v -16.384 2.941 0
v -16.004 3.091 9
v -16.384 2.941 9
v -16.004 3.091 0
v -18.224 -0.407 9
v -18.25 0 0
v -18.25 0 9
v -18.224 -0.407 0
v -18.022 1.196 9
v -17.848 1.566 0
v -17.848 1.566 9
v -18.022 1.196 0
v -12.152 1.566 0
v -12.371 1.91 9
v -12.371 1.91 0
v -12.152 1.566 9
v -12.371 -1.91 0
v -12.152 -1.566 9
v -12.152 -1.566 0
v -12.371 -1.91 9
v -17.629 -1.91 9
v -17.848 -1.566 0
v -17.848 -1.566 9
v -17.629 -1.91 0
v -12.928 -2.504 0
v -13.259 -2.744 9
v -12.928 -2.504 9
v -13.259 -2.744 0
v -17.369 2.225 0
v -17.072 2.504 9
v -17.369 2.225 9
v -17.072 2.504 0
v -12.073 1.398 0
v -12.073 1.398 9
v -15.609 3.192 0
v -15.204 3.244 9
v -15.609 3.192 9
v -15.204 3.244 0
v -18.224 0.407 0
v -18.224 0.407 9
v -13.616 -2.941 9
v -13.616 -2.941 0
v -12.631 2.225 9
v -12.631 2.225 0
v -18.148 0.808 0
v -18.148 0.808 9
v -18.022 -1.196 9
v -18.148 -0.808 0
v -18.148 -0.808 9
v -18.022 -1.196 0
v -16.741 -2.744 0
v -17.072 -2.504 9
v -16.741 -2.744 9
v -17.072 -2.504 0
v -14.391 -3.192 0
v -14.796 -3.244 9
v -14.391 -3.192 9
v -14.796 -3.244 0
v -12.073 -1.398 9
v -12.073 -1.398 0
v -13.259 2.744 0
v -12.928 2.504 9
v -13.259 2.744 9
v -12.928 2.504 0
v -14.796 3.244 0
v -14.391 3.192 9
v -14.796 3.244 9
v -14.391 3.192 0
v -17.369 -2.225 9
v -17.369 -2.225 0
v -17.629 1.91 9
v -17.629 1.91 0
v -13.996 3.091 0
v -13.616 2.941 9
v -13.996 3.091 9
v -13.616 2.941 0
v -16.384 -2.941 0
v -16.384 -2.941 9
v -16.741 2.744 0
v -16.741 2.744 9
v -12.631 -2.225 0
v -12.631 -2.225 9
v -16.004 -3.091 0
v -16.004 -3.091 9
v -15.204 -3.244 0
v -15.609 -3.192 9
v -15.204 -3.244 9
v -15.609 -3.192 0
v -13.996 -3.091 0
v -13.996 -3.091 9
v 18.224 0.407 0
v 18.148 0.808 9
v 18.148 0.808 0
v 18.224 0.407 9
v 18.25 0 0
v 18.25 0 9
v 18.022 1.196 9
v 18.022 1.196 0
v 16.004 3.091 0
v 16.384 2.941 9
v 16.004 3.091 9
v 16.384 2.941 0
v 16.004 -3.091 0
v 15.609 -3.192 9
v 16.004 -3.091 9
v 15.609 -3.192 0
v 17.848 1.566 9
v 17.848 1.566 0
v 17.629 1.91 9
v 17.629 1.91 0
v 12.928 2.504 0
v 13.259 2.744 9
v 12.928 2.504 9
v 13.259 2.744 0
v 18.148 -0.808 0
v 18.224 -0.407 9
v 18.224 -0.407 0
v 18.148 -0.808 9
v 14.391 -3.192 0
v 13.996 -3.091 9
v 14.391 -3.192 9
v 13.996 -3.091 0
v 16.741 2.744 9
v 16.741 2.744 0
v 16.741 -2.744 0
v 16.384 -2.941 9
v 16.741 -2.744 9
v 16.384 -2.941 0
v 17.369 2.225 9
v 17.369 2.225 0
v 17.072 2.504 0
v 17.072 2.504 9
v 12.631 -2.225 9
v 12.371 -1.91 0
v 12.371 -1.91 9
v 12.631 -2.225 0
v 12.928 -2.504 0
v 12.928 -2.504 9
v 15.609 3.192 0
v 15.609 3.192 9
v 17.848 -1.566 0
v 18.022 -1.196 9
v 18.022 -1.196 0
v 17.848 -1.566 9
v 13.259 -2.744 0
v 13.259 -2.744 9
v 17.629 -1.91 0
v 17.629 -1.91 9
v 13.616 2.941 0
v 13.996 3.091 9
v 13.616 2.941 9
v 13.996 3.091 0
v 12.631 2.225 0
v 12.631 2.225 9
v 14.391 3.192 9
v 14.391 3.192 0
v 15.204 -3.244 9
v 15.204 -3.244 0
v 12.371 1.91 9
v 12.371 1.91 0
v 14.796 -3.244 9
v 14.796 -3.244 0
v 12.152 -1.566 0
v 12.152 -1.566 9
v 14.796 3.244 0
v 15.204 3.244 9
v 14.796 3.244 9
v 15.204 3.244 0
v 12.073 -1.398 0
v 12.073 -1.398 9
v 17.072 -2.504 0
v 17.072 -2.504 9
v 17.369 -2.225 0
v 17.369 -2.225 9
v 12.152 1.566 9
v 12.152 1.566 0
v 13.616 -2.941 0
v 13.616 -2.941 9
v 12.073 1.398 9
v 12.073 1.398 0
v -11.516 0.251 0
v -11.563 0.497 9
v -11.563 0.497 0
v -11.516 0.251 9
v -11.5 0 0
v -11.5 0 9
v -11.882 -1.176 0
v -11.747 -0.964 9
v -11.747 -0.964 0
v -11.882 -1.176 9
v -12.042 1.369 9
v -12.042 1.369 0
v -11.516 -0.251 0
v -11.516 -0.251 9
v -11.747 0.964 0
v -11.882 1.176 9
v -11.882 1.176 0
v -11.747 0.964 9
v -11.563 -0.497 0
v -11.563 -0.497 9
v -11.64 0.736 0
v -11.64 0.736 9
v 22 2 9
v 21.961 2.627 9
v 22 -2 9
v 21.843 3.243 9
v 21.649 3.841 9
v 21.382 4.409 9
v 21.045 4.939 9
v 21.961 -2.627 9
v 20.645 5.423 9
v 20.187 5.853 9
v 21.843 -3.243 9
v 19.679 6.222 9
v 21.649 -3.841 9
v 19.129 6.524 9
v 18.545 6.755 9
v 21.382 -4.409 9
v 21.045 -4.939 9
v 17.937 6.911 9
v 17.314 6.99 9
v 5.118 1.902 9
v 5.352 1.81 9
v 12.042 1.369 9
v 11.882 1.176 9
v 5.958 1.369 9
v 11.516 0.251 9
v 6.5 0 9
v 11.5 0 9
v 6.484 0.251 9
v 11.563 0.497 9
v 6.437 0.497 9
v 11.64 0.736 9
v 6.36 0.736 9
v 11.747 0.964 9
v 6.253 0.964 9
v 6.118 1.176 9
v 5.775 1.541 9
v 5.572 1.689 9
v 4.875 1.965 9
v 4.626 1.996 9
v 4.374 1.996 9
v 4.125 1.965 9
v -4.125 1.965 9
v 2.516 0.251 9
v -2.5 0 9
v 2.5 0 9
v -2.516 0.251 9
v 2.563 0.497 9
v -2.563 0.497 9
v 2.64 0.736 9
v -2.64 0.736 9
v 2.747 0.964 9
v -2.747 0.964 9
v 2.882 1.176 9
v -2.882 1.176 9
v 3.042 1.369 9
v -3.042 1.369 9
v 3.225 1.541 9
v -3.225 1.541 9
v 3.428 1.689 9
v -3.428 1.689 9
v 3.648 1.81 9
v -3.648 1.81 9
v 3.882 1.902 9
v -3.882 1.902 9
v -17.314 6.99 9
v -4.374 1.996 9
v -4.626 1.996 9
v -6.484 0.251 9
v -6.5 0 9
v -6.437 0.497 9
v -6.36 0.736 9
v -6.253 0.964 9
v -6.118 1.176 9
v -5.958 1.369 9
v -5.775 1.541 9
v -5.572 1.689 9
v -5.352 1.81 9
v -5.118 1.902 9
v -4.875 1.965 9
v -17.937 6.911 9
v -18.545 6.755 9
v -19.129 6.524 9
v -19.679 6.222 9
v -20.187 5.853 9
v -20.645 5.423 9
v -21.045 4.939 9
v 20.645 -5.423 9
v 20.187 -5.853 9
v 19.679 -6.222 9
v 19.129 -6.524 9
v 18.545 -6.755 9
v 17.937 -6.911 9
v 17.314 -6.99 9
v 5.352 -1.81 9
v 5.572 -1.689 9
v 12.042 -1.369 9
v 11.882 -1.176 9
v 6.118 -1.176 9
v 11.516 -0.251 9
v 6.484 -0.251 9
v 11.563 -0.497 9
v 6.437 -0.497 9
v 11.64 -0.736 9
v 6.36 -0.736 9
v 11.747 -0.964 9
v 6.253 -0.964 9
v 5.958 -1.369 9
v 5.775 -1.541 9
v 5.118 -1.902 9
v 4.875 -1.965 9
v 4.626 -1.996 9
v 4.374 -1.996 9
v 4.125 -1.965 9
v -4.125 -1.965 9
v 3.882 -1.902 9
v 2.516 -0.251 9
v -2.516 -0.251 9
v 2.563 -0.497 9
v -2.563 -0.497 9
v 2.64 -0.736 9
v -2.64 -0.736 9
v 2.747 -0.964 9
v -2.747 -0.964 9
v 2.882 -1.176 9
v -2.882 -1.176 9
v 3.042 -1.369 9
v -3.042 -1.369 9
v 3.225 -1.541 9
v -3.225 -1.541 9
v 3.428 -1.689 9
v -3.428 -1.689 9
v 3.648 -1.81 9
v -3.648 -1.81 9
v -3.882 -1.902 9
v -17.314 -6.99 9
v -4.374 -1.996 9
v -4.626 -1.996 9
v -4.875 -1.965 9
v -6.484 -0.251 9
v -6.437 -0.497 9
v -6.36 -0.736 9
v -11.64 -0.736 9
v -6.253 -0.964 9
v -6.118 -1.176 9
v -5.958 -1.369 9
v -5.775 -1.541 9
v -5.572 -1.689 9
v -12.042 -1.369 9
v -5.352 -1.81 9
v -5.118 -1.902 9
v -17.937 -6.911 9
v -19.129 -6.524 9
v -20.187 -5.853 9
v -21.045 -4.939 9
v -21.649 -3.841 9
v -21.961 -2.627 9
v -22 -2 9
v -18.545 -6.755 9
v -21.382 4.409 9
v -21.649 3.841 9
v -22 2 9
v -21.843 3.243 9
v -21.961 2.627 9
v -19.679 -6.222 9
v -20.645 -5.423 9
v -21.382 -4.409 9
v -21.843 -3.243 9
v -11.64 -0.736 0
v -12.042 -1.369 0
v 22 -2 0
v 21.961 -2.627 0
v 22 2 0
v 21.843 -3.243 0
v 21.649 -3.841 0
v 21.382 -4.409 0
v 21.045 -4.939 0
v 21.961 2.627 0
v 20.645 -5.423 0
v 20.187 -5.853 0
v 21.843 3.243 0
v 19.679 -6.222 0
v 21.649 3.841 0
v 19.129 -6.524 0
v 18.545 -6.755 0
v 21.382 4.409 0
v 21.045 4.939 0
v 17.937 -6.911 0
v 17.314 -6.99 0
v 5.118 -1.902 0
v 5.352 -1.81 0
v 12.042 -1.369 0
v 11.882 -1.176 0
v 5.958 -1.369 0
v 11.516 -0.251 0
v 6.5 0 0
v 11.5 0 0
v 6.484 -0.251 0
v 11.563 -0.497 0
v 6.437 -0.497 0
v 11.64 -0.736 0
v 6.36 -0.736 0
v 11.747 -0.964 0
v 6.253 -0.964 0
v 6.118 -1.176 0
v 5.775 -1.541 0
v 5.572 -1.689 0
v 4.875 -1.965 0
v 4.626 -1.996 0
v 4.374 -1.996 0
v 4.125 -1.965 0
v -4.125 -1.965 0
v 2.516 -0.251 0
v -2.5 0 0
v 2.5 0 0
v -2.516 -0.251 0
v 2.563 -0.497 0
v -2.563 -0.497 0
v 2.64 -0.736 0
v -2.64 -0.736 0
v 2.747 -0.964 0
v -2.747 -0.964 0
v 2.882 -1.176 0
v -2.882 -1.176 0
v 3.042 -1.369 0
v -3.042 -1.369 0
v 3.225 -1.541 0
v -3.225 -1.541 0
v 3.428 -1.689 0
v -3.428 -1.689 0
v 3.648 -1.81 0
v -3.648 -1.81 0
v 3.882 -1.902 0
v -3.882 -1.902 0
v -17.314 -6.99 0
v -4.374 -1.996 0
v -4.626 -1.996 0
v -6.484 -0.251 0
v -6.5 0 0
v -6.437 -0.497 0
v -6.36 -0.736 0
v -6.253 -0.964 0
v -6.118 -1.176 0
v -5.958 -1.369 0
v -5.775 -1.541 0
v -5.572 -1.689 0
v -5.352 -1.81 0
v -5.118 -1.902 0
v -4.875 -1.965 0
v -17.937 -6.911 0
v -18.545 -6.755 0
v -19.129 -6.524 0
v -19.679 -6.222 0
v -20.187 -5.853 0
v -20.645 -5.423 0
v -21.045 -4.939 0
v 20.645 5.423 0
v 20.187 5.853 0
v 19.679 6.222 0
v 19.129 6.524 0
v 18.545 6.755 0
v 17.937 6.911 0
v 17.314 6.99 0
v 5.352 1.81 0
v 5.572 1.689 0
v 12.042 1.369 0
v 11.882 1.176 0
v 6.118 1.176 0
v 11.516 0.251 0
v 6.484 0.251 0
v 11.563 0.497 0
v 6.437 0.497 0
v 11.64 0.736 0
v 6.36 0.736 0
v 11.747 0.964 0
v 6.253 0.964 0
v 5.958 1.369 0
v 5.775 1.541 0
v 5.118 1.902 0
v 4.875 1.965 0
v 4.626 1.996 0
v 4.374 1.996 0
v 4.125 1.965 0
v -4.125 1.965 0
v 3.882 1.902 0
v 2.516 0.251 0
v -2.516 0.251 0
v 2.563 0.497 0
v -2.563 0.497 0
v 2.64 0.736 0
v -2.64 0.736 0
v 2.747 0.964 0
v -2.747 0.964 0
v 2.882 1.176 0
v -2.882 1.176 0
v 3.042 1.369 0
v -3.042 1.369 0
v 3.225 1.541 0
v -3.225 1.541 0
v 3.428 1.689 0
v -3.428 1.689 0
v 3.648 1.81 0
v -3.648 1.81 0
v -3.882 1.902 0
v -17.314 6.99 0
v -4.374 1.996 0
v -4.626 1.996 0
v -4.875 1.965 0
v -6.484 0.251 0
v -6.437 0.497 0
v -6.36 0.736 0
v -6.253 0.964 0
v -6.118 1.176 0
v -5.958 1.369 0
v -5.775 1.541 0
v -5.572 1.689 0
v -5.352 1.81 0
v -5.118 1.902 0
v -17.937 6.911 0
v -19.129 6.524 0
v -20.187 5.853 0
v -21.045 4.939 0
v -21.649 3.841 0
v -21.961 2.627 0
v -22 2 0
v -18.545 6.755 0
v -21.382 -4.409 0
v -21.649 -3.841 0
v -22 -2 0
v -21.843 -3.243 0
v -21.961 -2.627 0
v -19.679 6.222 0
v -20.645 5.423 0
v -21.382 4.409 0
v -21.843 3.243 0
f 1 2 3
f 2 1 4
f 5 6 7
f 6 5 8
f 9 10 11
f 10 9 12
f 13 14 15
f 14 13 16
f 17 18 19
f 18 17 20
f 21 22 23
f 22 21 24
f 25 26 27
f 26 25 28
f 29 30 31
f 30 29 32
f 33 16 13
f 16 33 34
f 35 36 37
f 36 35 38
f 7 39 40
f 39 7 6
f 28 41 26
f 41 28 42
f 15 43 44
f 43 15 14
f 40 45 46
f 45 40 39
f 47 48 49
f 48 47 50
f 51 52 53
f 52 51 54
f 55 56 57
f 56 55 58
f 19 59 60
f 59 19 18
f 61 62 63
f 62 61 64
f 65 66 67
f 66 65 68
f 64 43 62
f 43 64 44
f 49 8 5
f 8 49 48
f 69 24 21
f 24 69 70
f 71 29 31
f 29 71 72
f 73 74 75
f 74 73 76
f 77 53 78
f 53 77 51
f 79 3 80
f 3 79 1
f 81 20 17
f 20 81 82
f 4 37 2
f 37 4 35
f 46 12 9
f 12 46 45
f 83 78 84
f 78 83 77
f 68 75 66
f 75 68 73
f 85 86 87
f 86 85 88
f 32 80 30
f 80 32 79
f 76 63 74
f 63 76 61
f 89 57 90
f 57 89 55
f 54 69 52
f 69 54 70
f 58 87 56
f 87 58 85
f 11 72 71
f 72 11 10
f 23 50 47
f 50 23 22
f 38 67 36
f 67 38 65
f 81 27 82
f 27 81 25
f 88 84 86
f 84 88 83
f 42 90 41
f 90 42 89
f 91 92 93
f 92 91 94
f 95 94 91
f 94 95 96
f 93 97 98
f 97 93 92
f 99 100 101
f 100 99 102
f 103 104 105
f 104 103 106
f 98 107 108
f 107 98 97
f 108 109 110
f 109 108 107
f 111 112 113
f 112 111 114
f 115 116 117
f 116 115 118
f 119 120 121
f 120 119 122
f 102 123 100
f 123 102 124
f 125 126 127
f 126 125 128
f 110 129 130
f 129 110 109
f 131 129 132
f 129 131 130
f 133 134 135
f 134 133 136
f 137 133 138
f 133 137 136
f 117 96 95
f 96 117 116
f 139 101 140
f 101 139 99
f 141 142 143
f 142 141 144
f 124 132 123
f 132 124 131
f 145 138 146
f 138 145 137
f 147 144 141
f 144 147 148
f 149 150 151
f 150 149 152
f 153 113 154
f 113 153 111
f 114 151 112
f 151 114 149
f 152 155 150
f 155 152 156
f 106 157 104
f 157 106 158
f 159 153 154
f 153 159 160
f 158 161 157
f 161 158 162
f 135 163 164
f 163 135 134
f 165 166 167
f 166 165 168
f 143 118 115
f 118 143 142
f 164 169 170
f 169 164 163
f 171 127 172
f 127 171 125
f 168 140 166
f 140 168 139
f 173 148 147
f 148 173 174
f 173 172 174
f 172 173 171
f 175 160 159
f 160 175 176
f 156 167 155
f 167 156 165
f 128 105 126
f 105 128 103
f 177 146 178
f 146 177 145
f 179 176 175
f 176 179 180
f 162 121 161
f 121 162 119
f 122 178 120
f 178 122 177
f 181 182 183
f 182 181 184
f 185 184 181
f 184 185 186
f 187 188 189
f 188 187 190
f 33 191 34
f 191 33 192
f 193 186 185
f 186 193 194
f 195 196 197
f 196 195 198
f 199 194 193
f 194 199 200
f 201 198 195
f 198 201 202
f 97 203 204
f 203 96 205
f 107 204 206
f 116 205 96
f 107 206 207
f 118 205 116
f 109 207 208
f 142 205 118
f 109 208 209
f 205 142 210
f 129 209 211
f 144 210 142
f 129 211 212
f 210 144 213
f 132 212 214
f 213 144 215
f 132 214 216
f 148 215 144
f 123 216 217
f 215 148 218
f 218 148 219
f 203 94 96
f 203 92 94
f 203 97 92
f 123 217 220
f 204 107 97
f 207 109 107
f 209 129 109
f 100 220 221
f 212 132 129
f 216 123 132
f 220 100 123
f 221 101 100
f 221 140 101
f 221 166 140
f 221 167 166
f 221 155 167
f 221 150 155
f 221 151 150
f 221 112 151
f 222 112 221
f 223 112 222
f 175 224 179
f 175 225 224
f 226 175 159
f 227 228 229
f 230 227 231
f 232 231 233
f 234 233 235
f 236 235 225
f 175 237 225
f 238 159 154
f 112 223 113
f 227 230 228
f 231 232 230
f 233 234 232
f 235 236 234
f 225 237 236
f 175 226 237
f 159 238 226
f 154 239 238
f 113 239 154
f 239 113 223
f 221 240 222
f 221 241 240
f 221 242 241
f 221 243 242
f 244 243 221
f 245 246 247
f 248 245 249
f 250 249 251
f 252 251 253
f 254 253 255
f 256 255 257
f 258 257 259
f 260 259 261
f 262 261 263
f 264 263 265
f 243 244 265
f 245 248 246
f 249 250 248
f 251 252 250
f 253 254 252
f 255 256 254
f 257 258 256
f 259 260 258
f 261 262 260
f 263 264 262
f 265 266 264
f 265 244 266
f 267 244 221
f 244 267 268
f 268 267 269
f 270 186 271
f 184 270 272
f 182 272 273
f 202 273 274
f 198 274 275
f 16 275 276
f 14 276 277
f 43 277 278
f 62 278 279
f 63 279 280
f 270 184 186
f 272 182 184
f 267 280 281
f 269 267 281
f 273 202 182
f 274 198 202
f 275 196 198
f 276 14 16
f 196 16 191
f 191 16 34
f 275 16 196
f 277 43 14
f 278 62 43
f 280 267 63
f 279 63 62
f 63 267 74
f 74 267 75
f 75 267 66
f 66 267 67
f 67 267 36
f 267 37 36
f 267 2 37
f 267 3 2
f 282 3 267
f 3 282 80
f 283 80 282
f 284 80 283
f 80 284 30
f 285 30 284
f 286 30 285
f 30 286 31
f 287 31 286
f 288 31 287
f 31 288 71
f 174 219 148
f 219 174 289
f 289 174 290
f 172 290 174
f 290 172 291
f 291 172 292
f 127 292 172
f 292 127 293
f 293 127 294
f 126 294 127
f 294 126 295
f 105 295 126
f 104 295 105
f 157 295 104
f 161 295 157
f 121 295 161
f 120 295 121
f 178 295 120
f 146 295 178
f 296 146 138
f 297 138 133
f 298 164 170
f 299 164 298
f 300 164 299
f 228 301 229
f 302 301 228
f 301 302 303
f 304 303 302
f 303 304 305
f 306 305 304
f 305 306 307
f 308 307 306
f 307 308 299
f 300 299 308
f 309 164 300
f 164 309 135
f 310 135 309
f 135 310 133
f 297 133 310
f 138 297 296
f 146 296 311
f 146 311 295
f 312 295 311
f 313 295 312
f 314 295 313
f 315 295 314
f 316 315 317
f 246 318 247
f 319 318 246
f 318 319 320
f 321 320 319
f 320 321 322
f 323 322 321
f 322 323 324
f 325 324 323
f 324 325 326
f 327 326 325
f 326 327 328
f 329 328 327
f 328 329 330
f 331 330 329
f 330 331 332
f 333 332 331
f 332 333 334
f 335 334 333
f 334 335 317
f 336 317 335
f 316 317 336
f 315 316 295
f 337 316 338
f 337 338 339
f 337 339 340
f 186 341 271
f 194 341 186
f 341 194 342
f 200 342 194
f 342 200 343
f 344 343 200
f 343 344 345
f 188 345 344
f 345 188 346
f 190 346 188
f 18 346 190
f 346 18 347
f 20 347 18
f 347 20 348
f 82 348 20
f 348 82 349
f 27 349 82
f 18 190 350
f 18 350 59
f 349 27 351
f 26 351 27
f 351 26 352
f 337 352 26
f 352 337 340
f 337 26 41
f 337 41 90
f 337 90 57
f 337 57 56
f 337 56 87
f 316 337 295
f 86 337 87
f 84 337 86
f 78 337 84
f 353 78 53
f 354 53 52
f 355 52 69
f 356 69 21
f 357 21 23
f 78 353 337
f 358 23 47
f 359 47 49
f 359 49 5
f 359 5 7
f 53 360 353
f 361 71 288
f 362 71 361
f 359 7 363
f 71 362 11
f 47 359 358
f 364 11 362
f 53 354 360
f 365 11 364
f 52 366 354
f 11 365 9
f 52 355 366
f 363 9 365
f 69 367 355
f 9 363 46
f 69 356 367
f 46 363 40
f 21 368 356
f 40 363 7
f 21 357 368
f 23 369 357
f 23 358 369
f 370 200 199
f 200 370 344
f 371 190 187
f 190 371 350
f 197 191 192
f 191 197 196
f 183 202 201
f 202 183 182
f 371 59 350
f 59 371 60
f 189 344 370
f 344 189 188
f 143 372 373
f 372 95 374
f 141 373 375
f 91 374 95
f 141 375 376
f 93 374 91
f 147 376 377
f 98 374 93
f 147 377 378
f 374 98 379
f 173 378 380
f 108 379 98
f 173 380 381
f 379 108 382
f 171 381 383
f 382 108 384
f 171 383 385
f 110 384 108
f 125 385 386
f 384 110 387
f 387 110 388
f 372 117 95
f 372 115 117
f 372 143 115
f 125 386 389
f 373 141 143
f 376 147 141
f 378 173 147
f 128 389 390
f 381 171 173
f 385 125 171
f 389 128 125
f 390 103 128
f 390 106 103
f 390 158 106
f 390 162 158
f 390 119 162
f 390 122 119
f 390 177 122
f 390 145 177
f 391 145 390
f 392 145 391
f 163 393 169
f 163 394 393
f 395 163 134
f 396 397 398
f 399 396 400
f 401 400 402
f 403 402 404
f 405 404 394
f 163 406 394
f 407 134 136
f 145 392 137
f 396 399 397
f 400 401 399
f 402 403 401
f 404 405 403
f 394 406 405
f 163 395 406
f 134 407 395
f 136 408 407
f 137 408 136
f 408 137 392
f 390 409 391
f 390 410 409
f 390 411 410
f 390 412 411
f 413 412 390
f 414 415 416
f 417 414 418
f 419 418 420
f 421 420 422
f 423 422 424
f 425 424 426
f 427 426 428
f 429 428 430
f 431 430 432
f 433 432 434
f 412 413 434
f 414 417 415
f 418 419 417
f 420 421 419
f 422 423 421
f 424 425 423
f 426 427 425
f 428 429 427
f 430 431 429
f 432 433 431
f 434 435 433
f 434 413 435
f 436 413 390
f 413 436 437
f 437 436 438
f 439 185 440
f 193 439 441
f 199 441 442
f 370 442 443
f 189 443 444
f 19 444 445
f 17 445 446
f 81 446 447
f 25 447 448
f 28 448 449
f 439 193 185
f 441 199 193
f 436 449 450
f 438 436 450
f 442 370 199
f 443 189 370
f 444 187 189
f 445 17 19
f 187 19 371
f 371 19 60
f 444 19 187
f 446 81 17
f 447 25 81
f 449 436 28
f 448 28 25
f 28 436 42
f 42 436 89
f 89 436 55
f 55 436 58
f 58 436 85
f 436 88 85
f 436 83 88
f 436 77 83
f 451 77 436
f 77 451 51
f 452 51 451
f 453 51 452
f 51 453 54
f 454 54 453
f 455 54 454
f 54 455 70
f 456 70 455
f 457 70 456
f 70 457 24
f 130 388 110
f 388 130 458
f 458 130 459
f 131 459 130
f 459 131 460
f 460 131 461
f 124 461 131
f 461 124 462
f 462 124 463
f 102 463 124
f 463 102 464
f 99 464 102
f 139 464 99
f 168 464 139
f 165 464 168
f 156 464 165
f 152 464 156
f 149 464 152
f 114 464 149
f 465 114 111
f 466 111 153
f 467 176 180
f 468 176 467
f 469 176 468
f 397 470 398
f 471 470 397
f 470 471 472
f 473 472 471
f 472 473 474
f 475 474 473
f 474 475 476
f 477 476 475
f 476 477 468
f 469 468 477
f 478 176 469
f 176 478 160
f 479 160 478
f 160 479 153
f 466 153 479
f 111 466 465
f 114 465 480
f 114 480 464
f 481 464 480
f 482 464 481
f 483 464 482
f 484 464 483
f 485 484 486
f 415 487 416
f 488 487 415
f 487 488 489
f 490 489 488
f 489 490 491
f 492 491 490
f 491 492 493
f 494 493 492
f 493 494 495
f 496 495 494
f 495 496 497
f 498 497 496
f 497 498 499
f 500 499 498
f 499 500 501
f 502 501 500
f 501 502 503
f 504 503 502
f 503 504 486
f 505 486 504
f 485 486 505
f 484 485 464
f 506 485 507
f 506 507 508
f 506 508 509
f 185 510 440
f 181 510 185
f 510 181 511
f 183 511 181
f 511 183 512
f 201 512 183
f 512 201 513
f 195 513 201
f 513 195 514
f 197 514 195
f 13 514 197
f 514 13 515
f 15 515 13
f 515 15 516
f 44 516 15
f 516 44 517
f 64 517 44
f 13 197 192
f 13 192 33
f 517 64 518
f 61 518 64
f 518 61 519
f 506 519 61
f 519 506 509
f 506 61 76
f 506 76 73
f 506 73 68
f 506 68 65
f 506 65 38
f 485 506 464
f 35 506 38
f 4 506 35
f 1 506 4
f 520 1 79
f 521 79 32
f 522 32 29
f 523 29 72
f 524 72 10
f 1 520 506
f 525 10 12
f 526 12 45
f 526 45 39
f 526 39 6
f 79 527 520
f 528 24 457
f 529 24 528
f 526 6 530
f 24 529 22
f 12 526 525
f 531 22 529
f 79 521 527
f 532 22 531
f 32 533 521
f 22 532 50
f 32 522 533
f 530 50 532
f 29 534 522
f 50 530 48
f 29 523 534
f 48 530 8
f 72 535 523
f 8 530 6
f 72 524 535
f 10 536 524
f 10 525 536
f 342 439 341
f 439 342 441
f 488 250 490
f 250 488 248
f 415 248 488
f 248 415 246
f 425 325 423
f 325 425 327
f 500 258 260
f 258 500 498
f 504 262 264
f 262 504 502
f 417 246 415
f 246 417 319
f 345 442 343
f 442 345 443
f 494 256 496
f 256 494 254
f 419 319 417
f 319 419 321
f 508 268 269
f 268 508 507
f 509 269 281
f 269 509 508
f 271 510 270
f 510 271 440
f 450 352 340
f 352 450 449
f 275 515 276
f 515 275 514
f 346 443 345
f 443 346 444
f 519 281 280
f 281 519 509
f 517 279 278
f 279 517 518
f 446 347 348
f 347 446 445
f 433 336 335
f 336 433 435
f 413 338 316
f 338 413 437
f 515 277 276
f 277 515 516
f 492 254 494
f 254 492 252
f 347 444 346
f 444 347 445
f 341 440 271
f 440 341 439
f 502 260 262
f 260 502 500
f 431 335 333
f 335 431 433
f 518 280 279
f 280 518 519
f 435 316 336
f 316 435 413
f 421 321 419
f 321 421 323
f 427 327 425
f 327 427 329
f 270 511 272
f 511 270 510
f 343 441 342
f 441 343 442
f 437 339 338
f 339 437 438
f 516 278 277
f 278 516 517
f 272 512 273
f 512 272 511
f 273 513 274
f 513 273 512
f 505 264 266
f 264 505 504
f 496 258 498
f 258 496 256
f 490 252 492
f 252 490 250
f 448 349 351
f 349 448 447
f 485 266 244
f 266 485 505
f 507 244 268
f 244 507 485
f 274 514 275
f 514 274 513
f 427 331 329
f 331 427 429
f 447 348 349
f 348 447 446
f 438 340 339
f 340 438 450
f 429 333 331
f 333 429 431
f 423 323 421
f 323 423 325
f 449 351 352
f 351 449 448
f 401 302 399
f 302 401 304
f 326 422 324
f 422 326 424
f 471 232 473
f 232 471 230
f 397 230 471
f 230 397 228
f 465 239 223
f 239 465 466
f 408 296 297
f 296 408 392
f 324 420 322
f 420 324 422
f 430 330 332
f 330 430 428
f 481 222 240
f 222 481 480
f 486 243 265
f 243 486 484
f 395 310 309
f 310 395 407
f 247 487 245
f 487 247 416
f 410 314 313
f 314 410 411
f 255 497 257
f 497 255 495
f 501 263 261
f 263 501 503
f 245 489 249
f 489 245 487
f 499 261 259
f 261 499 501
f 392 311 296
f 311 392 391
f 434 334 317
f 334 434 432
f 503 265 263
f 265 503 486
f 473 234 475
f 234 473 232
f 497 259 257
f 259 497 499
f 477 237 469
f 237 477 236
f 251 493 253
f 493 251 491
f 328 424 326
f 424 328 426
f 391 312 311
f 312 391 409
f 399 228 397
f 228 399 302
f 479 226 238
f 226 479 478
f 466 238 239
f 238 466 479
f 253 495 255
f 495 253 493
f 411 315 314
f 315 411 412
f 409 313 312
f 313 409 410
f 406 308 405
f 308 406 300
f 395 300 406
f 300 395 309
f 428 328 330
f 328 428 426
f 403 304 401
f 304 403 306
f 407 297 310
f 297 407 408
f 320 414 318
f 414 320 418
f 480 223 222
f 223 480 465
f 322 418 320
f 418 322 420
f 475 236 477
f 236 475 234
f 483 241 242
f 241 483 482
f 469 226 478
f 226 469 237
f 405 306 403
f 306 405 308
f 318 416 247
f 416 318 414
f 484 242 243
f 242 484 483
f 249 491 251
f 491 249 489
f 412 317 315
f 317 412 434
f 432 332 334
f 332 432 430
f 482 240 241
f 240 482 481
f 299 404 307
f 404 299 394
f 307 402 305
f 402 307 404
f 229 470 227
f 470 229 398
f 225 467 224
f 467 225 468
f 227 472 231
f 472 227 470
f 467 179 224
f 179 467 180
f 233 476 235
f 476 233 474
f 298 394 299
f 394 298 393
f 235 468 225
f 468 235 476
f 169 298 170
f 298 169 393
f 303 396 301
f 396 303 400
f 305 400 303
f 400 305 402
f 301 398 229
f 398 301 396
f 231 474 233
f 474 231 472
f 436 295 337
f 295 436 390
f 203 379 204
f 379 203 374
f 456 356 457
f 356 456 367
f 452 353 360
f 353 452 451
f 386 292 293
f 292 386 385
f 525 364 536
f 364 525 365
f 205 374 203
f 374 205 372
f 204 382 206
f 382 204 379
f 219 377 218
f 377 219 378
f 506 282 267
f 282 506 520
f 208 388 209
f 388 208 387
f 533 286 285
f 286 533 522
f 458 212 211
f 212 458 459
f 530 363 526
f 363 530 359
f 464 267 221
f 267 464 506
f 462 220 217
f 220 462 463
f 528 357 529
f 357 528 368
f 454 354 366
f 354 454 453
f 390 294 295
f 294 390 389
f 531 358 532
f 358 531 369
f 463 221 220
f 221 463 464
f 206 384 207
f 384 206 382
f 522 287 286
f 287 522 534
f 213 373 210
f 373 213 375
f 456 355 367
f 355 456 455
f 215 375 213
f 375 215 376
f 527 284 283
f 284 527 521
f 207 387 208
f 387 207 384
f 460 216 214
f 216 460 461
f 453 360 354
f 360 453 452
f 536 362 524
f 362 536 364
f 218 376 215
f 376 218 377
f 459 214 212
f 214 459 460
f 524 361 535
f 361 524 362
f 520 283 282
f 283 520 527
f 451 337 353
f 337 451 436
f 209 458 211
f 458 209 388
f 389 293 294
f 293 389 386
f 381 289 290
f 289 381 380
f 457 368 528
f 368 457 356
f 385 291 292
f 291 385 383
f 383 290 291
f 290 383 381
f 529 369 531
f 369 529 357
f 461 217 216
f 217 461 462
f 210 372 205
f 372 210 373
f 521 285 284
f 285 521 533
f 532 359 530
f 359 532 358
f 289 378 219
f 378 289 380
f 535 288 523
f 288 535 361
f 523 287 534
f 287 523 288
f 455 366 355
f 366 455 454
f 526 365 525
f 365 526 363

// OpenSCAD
$fn = 50;


difference() {
	union() {
		hull() {
			translate(v = [-17.0000000000, 2.0000000000, 0]) {
				cylinder(h = 9, r = 5);
			}
			translate(v = [17.0000000000, 2.0000000000, 0]) {
				cylinder(h = 9, r = 5);
			}
			translate(v = [-17.0000000000, -2.0000000000, 0]) {
				cylinder(h = 9, r = 5);
			}
			translate(v = [17.0000000000, -2.0000000000, 0]) {
				cylinder(h = 9, r = 5);
			}
		}
	}
	union() {
		#translate(v = [-15.0000000000, 0.0000000000, -100.0000000000]) {
			cylinder(h = 200, r = 3.2500000000);
		}
		#translate(v = [-15.0000000000, 0.0000000000, -100.0000000000]) {
			cylinder(h = 200, r = 3.2500000000);
		}
		#translate(v = [15.0000000000, 0.0000000000, -100.0000000000]) {
			cylinder(h = 200, r = 3.2500000000);
		}
		#translate(v = [15.0000000000, 0.0000000000, -100.0000000000]) {
			cylinder(h = 200, r = 3.2500000000);
		}
		#translate(v = [-13.5000000000, 0, 0]) {
			cylinder(h = 9, r = 2.0000000000);
		}
		#translate(v = [-4.5000000000, 0, 0]) {
			cylinder(h = 9, r = 2.0000000000);
		}
		#translate(v = [4.5000000000, 0, 0]) {
			cylinder(h = 9, r = 2.0000000000);
		}
		#translate(v = [13.5000000000, 0, 0]) {
			cylinder(h = 9, r = 2.0000000000);
		}
	}
}
